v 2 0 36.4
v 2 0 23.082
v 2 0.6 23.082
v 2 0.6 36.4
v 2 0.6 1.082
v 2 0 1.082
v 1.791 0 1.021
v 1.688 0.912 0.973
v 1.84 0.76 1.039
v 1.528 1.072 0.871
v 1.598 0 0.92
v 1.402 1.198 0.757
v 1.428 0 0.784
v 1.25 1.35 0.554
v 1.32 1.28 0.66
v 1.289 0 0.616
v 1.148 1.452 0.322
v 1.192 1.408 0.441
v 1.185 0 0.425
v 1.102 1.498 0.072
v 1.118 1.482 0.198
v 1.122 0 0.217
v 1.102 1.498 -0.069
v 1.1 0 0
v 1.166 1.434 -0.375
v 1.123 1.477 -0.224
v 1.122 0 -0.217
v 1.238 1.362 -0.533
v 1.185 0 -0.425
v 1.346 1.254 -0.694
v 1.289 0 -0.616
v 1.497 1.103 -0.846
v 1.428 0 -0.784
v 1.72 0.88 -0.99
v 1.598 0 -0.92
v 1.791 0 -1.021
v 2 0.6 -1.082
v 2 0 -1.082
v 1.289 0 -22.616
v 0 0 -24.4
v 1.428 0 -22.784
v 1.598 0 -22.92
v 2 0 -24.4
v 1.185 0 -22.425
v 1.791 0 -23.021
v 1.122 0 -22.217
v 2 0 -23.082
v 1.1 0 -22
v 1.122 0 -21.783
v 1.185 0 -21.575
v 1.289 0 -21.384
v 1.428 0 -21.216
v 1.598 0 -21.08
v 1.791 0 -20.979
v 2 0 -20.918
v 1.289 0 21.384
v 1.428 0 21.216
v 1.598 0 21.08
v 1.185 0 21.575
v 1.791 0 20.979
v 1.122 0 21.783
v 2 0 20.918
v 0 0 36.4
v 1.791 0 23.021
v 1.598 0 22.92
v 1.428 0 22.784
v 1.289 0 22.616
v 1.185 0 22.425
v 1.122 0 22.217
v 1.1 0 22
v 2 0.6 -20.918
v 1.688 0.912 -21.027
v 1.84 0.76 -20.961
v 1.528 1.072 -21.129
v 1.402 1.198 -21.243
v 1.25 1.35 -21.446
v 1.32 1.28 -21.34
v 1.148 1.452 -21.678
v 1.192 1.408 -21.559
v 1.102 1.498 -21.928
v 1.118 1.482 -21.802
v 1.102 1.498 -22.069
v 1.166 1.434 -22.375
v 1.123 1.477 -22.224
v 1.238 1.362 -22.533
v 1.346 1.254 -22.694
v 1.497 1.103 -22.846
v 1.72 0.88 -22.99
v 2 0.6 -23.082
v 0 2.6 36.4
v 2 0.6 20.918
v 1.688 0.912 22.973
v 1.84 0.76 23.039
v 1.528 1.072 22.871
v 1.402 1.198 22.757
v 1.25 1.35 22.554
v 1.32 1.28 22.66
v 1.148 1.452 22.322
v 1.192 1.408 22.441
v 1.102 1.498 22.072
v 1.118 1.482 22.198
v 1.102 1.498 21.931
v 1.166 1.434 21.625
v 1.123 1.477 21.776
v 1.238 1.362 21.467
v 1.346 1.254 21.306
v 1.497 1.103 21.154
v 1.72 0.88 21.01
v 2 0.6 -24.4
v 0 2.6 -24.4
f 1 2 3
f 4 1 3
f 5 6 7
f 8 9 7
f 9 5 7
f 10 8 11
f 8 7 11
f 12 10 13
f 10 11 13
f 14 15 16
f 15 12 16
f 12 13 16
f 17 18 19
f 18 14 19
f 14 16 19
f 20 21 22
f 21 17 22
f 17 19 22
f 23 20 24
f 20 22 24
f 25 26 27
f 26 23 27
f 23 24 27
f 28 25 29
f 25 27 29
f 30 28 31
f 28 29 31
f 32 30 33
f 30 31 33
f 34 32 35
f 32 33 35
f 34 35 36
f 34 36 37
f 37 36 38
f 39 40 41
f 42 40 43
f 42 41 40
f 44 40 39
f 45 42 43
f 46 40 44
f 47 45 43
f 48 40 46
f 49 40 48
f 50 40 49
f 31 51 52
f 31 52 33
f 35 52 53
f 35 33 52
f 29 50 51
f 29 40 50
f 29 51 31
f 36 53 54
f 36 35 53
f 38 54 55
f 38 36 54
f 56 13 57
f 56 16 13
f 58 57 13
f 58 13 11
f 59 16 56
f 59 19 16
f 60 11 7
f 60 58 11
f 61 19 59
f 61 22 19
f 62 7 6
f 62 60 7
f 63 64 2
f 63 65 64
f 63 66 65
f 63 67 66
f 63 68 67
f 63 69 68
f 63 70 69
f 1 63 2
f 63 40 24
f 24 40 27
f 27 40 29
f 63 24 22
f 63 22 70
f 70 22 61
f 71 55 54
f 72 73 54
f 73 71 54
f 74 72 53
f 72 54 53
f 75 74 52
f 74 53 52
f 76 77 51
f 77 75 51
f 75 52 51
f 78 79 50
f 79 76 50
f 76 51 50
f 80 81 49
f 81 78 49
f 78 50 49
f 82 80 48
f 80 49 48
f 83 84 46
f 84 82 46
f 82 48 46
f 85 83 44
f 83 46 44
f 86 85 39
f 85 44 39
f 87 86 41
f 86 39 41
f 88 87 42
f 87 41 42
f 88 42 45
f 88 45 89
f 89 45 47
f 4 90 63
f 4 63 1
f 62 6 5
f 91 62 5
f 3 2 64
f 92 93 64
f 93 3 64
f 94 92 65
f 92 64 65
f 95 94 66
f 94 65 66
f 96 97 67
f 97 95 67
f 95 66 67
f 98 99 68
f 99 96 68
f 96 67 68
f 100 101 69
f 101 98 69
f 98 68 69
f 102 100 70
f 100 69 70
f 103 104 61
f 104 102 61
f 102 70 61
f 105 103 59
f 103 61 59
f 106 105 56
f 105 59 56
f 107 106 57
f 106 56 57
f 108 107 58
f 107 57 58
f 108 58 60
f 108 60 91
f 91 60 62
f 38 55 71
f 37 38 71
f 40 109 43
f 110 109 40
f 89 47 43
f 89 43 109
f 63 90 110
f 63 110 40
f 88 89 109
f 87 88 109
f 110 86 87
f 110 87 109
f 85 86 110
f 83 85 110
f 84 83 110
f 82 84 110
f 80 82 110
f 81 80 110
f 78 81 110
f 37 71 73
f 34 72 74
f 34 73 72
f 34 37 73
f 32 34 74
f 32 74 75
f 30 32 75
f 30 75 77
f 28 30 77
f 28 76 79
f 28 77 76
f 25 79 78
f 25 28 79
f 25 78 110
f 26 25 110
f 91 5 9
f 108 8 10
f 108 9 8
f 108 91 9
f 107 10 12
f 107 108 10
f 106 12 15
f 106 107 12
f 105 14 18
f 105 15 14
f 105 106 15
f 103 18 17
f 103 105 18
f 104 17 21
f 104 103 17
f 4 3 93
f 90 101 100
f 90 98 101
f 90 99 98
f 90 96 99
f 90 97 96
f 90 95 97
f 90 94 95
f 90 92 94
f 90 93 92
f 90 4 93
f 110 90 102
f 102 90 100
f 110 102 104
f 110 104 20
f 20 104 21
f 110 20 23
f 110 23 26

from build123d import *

# Parameters (mm, degrees)
BOSS_EXTRUDE1_DEPTH = 36.4
CUT_EXTRUDE1_REACH  = 4.6
SKETCH2_R           = 1.1
CUT_EXTRUDE3_START  = -2.6
SKETCH4_W           = 2
SKETCH4_H           = 12
CUT_EXTRUDE3_DEPTH  = 2.6


with BuildPart() as part:
    # Sketch1 → Boss-Extrude1 (new body, symmetric)
    with BuildSketch(Plane.XY):
        Polygon((0, 2.6), (0, 0), (2, 0), (2, 0.6), align=None)
    extrude(amount=BOSS_EXTRUDE1_DEPTH, both=True)

    # Cut-Extrude1: up to this face of the body (flat: up to its plane)
    cut_extrude1_end = Plane(part.part.faces().sort_by_distance((1, 1.6, 0))[0])
    # Sketch2 → Cut-Extrude1 (cut, up to the picked face)
    with BuildSketch(Plane.XZ, mode=Mode.PRIVATE) as cut_extrude1_sk1:
        with Locations((2.2, 0)):
            Circle(SKETCH2_R)
    cut_extrude1_tool1 = split(extrude(cut_extrude1_sk1.sketch, amount=-CUT_EXTRUDE1_REACH, mode=Mode.PRIVATE), bisect_by=cut_extrude1_end, keep=Keep.BOTH, mode=Mode.PRIVATE)
    add(cut_extrude1_tool1.solids().sort_by_distance((2.2, 0, 0))[0], mode=Mode.SUBTRACT)
    # Sketch2 → Cut-Extrude1 (cut, up to the picked face)
    with BuildSketch(Plane.XZ, mode=Mode.PRIVATE) as cut_extrude1_sk2:
        with Locations((2.2, 22)):
            Circle(SKETCH2_R)
    cut_extrude1_tool2 = split(extrude(cut_extrude1_sk2.sketch, amount=-CUT_EXTRUDE1_REACH, mode=Mode.PRIVATE), bisect_by=cut_extrude1_end, keep=Keep.BOTH, mode=Mode.PRIVATE)
    add(cut_extrude1_tool2.solids().sort_by_distance((2.2, 0, 22))[0], mode=Mode.SUBTRACT)
    # Sketch2 → Cut-Extrude1 (cut, up to the picked face)
    with BuildSketch(Plane.XZ, mode=Mode.PRIVATE) as cut_extrude1_sk3:
        with Locations((2.2, -22)):
            Circle(SKETCH2_R)
    cut_extrude1_tool3 = split(extrude(cut_extrude1_sk3.sketch, amount=-CUT_EXTRUDE1_REACH, mode=Mode.PRIVATE), bisect_by=cut_extrude1_end, keep=Keep.BOTH, mode=Mode.PRIVATE)
    add(cut_extrude1_tool3.solids().sort_by_distance((2.2, 0, -22))[0], mode=Mode.SUBTRACT)

    # Sketch4 → Cut-Extrude3 (cut)
    with BuildSketch(Plane(origin=(0, 0, 0), x_dir=(-1, 0, 0), z_dir=(0, -1, 0)).offset(CUT_EXTRUDE3_START)):
        with Locations((-1, 30.4)):
            Rectangle(SKETCH4_W, SKETCH4_H)
    extrude(amount=CUT_EXTRUDE3_DEPTH, mode=Mode.SUBTRACT)


solid = part.part
